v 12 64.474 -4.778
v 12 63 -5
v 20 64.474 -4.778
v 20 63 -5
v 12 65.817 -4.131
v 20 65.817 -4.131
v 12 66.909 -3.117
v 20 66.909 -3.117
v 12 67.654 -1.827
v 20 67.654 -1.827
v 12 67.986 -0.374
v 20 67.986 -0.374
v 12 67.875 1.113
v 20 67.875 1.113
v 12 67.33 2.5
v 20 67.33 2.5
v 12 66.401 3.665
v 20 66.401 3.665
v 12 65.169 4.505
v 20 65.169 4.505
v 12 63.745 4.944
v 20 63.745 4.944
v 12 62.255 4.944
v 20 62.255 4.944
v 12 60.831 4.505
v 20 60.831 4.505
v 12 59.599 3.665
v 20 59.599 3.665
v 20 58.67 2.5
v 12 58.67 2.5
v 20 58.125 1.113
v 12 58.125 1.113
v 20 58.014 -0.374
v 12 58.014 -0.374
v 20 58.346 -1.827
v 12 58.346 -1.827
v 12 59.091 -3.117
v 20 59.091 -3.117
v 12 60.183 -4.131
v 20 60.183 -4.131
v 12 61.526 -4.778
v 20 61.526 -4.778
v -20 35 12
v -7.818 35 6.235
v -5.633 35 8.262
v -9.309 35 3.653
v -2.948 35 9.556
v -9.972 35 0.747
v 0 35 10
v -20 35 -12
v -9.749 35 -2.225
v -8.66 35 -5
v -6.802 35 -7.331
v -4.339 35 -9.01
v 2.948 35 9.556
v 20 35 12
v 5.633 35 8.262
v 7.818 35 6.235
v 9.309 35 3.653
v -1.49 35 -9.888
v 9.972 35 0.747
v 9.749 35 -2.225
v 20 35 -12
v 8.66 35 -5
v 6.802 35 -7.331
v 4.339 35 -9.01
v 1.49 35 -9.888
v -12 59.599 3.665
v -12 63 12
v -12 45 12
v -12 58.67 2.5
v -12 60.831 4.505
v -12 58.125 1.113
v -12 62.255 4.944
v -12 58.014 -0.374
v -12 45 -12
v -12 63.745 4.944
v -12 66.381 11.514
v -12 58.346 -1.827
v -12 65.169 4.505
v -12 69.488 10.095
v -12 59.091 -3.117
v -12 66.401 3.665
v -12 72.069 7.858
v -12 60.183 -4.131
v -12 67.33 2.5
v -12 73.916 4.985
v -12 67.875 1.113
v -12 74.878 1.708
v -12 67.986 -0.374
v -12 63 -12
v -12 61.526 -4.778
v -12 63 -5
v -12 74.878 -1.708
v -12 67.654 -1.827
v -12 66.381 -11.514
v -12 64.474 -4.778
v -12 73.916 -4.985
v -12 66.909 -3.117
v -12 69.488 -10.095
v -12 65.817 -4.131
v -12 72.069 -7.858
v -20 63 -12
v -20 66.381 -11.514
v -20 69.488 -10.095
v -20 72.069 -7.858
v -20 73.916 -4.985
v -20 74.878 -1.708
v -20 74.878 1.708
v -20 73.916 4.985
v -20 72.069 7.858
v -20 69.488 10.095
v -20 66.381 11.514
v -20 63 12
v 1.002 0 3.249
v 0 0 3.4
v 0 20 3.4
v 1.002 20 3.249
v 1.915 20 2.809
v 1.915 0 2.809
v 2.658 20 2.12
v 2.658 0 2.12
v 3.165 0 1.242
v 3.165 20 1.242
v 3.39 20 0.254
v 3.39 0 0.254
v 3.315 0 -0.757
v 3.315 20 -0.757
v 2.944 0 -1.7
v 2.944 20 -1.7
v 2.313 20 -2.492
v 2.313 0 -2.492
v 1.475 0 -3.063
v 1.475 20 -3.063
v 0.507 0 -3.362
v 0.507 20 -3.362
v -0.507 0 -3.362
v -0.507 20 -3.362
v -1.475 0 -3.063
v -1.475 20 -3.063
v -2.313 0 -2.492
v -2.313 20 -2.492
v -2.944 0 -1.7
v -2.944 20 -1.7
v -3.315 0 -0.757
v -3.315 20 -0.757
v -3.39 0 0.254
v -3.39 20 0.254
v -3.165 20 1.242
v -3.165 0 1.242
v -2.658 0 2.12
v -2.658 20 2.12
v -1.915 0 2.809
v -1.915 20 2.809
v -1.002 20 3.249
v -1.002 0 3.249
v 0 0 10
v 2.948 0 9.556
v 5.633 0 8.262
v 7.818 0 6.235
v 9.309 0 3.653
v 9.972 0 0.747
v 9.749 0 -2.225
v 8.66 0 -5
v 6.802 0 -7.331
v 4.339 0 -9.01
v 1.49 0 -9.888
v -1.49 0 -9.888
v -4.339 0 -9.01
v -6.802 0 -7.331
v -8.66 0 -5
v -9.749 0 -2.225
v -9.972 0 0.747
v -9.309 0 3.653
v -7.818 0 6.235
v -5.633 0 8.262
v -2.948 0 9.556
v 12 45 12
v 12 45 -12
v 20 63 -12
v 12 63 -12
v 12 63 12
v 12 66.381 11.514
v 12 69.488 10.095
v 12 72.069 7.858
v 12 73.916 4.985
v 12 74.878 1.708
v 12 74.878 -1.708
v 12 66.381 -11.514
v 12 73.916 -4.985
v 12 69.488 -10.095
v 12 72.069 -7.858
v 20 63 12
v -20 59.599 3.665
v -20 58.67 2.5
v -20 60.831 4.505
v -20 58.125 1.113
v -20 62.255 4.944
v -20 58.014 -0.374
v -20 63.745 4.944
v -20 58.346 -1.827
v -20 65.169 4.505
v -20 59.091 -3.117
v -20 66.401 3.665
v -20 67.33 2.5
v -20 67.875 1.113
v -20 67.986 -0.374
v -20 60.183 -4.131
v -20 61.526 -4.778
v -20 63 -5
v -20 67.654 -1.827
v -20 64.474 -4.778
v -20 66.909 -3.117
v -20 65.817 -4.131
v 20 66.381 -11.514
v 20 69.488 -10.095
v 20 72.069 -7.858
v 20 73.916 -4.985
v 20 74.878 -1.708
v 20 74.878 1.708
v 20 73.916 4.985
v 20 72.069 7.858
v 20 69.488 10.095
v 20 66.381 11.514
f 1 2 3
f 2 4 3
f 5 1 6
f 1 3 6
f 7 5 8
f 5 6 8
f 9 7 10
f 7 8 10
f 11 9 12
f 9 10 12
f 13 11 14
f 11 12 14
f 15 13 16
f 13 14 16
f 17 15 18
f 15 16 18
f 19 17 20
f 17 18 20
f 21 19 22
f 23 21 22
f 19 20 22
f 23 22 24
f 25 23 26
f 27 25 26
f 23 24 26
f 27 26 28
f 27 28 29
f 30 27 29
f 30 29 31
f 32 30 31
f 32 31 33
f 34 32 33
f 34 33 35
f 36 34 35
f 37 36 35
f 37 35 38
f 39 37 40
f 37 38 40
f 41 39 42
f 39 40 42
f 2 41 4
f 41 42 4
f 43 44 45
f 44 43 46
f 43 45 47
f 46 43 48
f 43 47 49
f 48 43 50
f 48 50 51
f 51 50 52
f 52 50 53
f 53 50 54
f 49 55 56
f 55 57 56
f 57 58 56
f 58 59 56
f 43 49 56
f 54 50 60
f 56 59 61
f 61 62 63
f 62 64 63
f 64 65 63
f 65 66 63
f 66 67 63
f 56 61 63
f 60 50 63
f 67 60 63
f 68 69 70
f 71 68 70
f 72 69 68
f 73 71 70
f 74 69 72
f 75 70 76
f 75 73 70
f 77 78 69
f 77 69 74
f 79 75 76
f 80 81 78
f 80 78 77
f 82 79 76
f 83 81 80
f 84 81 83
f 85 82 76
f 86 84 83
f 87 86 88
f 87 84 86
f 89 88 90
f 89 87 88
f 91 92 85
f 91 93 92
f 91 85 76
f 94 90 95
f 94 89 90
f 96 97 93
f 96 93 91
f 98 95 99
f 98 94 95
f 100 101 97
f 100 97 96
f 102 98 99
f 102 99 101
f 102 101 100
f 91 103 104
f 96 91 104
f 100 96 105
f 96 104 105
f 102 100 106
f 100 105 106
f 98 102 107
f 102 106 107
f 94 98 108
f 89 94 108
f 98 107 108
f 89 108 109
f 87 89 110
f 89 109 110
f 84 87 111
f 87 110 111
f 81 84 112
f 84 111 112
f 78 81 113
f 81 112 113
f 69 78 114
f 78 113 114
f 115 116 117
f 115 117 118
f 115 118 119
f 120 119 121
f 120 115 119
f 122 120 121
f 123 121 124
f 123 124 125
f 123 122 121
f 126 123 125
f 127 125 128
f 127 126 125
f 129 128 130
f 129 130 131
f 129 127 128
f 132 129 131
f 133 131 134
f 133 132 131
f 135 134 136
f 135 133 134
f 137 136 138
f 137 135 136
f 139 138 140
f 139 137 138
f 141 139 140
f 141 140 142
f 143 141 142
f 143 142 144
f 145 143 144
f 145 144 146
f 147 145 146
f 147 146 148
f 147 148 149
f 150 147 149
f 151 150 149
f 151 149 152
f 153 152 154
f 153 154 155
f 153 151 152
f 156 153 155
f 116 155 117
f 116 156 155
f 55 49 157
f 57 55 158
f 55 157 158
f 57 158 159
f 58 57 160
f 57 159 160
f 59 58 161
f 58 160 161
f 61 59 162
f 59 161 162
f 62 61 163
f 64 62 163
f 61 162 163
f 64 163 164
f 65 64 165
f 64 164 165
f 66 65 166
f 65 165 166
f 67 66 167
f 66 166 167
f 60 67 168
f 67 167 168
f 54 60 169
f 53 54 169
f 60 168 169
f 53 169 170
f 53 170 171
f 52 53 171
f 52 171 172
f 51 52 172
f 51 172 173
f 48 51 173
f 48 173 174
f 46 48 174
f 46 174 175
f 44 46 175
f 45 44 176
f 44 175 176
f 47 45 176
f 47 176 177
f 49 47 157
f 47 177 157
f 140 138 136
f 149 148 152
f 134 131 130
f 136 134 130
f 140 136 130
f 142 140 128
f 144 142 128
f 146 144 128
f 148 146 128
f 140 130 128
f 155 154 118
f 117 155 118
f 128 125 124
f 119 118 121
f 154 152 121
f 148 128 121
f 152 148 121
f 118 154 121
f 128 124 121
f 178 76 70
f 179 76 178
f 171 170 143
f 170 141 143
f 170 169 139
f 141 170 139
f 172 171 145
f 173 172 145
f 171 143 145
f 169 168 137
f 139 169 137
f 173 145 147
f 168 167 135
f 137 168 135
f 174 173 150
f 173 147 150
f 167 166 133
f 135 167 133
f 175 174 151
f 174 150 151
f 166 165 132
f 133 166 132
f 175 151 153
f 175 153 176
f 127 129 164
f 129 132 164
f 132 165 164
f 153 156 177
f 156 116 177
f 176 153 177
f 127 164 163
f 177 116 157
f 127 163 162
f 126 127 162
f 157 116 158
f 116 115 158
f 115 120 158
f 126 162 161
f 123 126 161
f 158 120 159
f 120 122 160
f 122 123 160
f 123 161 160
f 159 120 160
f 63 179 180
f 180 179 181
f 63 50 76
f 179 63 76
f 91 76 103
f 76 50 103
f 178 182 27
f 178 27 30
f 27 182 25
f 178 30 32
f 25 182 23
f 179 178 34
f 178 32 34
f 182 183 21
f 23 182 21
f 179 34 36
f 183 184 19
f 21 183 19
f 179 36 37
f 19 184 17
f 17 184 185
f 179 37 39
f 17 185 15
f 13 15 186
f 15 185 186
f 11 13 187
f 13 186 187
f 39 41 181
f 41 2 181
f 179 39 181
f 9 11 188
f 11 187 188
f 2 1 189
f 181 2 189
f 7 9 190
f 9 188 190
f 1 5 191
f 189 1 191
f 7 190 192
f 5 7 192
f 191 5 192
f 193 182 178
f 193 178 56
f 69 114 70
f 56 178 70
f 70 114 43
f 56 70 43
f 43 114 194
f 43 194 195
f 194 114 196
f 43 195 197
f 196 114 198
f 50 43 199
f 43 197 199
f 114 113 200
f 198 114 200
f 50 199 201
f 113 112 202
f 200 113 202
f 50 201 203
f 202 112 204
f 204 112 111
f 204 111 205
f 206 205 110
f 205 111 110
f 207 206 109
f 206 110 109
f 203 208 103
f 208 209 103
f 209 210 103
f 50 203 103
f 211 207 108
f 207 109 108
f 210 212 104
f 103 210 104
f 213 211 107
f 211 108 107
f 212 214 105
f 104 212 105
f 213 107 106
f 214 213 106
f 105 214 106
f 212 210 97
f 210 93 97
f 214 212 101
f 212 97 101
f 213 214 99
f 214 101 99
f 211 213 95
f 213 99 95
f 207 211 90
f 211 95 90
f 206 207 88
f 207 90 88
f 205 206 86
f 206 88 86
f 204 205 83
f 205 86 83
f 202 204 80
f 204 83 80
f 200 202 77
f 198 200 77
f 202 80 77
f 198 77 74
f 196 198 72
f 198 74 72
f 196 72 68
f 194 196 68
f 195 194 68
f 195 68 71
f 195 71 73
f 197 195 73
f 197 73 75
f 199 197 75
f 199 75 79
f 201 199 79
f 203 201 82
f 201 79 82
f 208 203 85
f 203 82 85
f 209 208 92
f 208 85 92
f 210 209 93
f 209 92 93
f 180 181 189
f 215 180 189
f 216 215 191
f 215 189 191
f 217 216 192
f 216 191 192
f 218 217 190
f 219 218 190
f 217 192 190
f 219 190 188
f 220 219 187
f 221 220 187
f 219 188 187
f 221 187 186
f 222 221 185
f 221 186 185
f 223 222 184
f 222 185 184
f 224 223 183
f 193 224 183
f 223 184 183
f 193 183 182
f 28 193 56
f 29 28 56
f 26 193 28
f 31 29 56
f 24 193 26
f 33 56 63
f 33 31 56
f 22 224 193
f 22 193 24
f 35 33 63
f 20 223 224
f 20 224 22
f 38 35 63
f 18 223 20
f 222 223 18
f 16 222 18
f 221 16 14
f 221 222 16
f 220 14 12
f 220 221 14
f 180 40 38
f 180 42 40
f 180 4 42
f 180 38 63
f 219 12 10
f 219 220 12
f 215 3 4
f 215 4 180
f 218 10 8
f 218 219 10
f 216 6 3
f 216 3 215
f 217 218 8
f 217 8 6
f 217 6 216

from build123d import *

# Parameters (mm, degrees)
SKETCH_1_R          = 10
EXTRUDE_1_DEPTH     = 35
SKETCH_2_W          = 40
SKETCH_2_H          = 24
EXTRUDE_2_DEPTH     = 10
EXTRUDE_3_DEPTH     = 8
EXTRUDE_4_DEPTH     = 8
SKETCH_5_R          = 5
CUT_EXTRUDE_1_DEPTH = 76
SKETCH_6_R          = 3.4
CUT_EXTRUDE_2_DEPTH = 20


with BuildPart() as part:
    # 草图1 → 凸台-拉伸1 (new body)
    with BuildSketch(Plane(origin=(0, 0, 0), x_dir=(1, 0, 0), z_dir=(0, 1, 0))):
        with Locations(Location((0, 0, 0), (0, 0, 270))):
            Circle(SKETCH_1_R)
    extrude(amount=EXTRUDE_1_DEPTH)

    # 草图2 → 凸台-拉伸2 (add)
    with BuildSketch(Plane(origin=(0, 35, 0), x_dir=(1, 0, 0), z_dir=(0, 1, 0))):
        Rectangle(SKETCH_2_W, SKETCH_2_H)
    extrude(amount=EXTRUDE_2_DEPTH)

    # 草图3 → 凸台-拉伸3 (add)
    with BuildSketch(Plane(origin=(12, 0, 0), x_dir=(0, 0, -1), z_dir=(1, 0, 0))):
        with BuildLine():
            Line((12, 45), (12, 63))
            ThreePointArc((12, 63), (0, 75), (-12, 63))
            Line((-12, 63), (-12, 45))
            Line((-12, 45), (12, 45))
        make_face()
    extrude(amount=EXTRUDE_3_DEPTH)

    # 草图4 → 凸台-拉伸4 (add)
    with BuildSketch(Plane(origin=(-20, 0, 0), x_dir=(0, 0, -1), z_dir=(1, 0, 0))):
        with BuildLine():
            Line((12, 45), (12, 63))
            ThreePointArc((12, 63), (0, 75), (-12, 63))
            Line((-12, 63), (-12, 45))
            Line((-12, 45), (12, 45))
        make_face()
    extrude(amount=EXTRUDE_4_DEPTH)

    # 草图5 → 切除-拉伸1 (cut, symmetric)
    with BuildSketch(Plane(origin=(-20, 0, 0), x_dir=(0, 0, -1), z_dir=(1, 0, 0))):
        with Locations((0, 63)):
            Circle(SKETCH_5_R)
    extrude(amount=CUT_EXTRUDE_1_DEPTH, both=True, mode=Mode.SUBTRACT)

    # 草图6 → 切除-拉伸2 (cut)
    with BuildSketch(Plane(origin=(0, 0, 0), x_dir=(1, 0, 0), z_dir=(0, 1, 0))):
        with Locations(Location((0, 0, 0), (0, 0, 270))):
            Circle(SKETCH_6_R)
    extrude(amount=CUT_EXTRUDE_2_DEPTH, mode=Mode.SUBTRACT)


solid = part.part
